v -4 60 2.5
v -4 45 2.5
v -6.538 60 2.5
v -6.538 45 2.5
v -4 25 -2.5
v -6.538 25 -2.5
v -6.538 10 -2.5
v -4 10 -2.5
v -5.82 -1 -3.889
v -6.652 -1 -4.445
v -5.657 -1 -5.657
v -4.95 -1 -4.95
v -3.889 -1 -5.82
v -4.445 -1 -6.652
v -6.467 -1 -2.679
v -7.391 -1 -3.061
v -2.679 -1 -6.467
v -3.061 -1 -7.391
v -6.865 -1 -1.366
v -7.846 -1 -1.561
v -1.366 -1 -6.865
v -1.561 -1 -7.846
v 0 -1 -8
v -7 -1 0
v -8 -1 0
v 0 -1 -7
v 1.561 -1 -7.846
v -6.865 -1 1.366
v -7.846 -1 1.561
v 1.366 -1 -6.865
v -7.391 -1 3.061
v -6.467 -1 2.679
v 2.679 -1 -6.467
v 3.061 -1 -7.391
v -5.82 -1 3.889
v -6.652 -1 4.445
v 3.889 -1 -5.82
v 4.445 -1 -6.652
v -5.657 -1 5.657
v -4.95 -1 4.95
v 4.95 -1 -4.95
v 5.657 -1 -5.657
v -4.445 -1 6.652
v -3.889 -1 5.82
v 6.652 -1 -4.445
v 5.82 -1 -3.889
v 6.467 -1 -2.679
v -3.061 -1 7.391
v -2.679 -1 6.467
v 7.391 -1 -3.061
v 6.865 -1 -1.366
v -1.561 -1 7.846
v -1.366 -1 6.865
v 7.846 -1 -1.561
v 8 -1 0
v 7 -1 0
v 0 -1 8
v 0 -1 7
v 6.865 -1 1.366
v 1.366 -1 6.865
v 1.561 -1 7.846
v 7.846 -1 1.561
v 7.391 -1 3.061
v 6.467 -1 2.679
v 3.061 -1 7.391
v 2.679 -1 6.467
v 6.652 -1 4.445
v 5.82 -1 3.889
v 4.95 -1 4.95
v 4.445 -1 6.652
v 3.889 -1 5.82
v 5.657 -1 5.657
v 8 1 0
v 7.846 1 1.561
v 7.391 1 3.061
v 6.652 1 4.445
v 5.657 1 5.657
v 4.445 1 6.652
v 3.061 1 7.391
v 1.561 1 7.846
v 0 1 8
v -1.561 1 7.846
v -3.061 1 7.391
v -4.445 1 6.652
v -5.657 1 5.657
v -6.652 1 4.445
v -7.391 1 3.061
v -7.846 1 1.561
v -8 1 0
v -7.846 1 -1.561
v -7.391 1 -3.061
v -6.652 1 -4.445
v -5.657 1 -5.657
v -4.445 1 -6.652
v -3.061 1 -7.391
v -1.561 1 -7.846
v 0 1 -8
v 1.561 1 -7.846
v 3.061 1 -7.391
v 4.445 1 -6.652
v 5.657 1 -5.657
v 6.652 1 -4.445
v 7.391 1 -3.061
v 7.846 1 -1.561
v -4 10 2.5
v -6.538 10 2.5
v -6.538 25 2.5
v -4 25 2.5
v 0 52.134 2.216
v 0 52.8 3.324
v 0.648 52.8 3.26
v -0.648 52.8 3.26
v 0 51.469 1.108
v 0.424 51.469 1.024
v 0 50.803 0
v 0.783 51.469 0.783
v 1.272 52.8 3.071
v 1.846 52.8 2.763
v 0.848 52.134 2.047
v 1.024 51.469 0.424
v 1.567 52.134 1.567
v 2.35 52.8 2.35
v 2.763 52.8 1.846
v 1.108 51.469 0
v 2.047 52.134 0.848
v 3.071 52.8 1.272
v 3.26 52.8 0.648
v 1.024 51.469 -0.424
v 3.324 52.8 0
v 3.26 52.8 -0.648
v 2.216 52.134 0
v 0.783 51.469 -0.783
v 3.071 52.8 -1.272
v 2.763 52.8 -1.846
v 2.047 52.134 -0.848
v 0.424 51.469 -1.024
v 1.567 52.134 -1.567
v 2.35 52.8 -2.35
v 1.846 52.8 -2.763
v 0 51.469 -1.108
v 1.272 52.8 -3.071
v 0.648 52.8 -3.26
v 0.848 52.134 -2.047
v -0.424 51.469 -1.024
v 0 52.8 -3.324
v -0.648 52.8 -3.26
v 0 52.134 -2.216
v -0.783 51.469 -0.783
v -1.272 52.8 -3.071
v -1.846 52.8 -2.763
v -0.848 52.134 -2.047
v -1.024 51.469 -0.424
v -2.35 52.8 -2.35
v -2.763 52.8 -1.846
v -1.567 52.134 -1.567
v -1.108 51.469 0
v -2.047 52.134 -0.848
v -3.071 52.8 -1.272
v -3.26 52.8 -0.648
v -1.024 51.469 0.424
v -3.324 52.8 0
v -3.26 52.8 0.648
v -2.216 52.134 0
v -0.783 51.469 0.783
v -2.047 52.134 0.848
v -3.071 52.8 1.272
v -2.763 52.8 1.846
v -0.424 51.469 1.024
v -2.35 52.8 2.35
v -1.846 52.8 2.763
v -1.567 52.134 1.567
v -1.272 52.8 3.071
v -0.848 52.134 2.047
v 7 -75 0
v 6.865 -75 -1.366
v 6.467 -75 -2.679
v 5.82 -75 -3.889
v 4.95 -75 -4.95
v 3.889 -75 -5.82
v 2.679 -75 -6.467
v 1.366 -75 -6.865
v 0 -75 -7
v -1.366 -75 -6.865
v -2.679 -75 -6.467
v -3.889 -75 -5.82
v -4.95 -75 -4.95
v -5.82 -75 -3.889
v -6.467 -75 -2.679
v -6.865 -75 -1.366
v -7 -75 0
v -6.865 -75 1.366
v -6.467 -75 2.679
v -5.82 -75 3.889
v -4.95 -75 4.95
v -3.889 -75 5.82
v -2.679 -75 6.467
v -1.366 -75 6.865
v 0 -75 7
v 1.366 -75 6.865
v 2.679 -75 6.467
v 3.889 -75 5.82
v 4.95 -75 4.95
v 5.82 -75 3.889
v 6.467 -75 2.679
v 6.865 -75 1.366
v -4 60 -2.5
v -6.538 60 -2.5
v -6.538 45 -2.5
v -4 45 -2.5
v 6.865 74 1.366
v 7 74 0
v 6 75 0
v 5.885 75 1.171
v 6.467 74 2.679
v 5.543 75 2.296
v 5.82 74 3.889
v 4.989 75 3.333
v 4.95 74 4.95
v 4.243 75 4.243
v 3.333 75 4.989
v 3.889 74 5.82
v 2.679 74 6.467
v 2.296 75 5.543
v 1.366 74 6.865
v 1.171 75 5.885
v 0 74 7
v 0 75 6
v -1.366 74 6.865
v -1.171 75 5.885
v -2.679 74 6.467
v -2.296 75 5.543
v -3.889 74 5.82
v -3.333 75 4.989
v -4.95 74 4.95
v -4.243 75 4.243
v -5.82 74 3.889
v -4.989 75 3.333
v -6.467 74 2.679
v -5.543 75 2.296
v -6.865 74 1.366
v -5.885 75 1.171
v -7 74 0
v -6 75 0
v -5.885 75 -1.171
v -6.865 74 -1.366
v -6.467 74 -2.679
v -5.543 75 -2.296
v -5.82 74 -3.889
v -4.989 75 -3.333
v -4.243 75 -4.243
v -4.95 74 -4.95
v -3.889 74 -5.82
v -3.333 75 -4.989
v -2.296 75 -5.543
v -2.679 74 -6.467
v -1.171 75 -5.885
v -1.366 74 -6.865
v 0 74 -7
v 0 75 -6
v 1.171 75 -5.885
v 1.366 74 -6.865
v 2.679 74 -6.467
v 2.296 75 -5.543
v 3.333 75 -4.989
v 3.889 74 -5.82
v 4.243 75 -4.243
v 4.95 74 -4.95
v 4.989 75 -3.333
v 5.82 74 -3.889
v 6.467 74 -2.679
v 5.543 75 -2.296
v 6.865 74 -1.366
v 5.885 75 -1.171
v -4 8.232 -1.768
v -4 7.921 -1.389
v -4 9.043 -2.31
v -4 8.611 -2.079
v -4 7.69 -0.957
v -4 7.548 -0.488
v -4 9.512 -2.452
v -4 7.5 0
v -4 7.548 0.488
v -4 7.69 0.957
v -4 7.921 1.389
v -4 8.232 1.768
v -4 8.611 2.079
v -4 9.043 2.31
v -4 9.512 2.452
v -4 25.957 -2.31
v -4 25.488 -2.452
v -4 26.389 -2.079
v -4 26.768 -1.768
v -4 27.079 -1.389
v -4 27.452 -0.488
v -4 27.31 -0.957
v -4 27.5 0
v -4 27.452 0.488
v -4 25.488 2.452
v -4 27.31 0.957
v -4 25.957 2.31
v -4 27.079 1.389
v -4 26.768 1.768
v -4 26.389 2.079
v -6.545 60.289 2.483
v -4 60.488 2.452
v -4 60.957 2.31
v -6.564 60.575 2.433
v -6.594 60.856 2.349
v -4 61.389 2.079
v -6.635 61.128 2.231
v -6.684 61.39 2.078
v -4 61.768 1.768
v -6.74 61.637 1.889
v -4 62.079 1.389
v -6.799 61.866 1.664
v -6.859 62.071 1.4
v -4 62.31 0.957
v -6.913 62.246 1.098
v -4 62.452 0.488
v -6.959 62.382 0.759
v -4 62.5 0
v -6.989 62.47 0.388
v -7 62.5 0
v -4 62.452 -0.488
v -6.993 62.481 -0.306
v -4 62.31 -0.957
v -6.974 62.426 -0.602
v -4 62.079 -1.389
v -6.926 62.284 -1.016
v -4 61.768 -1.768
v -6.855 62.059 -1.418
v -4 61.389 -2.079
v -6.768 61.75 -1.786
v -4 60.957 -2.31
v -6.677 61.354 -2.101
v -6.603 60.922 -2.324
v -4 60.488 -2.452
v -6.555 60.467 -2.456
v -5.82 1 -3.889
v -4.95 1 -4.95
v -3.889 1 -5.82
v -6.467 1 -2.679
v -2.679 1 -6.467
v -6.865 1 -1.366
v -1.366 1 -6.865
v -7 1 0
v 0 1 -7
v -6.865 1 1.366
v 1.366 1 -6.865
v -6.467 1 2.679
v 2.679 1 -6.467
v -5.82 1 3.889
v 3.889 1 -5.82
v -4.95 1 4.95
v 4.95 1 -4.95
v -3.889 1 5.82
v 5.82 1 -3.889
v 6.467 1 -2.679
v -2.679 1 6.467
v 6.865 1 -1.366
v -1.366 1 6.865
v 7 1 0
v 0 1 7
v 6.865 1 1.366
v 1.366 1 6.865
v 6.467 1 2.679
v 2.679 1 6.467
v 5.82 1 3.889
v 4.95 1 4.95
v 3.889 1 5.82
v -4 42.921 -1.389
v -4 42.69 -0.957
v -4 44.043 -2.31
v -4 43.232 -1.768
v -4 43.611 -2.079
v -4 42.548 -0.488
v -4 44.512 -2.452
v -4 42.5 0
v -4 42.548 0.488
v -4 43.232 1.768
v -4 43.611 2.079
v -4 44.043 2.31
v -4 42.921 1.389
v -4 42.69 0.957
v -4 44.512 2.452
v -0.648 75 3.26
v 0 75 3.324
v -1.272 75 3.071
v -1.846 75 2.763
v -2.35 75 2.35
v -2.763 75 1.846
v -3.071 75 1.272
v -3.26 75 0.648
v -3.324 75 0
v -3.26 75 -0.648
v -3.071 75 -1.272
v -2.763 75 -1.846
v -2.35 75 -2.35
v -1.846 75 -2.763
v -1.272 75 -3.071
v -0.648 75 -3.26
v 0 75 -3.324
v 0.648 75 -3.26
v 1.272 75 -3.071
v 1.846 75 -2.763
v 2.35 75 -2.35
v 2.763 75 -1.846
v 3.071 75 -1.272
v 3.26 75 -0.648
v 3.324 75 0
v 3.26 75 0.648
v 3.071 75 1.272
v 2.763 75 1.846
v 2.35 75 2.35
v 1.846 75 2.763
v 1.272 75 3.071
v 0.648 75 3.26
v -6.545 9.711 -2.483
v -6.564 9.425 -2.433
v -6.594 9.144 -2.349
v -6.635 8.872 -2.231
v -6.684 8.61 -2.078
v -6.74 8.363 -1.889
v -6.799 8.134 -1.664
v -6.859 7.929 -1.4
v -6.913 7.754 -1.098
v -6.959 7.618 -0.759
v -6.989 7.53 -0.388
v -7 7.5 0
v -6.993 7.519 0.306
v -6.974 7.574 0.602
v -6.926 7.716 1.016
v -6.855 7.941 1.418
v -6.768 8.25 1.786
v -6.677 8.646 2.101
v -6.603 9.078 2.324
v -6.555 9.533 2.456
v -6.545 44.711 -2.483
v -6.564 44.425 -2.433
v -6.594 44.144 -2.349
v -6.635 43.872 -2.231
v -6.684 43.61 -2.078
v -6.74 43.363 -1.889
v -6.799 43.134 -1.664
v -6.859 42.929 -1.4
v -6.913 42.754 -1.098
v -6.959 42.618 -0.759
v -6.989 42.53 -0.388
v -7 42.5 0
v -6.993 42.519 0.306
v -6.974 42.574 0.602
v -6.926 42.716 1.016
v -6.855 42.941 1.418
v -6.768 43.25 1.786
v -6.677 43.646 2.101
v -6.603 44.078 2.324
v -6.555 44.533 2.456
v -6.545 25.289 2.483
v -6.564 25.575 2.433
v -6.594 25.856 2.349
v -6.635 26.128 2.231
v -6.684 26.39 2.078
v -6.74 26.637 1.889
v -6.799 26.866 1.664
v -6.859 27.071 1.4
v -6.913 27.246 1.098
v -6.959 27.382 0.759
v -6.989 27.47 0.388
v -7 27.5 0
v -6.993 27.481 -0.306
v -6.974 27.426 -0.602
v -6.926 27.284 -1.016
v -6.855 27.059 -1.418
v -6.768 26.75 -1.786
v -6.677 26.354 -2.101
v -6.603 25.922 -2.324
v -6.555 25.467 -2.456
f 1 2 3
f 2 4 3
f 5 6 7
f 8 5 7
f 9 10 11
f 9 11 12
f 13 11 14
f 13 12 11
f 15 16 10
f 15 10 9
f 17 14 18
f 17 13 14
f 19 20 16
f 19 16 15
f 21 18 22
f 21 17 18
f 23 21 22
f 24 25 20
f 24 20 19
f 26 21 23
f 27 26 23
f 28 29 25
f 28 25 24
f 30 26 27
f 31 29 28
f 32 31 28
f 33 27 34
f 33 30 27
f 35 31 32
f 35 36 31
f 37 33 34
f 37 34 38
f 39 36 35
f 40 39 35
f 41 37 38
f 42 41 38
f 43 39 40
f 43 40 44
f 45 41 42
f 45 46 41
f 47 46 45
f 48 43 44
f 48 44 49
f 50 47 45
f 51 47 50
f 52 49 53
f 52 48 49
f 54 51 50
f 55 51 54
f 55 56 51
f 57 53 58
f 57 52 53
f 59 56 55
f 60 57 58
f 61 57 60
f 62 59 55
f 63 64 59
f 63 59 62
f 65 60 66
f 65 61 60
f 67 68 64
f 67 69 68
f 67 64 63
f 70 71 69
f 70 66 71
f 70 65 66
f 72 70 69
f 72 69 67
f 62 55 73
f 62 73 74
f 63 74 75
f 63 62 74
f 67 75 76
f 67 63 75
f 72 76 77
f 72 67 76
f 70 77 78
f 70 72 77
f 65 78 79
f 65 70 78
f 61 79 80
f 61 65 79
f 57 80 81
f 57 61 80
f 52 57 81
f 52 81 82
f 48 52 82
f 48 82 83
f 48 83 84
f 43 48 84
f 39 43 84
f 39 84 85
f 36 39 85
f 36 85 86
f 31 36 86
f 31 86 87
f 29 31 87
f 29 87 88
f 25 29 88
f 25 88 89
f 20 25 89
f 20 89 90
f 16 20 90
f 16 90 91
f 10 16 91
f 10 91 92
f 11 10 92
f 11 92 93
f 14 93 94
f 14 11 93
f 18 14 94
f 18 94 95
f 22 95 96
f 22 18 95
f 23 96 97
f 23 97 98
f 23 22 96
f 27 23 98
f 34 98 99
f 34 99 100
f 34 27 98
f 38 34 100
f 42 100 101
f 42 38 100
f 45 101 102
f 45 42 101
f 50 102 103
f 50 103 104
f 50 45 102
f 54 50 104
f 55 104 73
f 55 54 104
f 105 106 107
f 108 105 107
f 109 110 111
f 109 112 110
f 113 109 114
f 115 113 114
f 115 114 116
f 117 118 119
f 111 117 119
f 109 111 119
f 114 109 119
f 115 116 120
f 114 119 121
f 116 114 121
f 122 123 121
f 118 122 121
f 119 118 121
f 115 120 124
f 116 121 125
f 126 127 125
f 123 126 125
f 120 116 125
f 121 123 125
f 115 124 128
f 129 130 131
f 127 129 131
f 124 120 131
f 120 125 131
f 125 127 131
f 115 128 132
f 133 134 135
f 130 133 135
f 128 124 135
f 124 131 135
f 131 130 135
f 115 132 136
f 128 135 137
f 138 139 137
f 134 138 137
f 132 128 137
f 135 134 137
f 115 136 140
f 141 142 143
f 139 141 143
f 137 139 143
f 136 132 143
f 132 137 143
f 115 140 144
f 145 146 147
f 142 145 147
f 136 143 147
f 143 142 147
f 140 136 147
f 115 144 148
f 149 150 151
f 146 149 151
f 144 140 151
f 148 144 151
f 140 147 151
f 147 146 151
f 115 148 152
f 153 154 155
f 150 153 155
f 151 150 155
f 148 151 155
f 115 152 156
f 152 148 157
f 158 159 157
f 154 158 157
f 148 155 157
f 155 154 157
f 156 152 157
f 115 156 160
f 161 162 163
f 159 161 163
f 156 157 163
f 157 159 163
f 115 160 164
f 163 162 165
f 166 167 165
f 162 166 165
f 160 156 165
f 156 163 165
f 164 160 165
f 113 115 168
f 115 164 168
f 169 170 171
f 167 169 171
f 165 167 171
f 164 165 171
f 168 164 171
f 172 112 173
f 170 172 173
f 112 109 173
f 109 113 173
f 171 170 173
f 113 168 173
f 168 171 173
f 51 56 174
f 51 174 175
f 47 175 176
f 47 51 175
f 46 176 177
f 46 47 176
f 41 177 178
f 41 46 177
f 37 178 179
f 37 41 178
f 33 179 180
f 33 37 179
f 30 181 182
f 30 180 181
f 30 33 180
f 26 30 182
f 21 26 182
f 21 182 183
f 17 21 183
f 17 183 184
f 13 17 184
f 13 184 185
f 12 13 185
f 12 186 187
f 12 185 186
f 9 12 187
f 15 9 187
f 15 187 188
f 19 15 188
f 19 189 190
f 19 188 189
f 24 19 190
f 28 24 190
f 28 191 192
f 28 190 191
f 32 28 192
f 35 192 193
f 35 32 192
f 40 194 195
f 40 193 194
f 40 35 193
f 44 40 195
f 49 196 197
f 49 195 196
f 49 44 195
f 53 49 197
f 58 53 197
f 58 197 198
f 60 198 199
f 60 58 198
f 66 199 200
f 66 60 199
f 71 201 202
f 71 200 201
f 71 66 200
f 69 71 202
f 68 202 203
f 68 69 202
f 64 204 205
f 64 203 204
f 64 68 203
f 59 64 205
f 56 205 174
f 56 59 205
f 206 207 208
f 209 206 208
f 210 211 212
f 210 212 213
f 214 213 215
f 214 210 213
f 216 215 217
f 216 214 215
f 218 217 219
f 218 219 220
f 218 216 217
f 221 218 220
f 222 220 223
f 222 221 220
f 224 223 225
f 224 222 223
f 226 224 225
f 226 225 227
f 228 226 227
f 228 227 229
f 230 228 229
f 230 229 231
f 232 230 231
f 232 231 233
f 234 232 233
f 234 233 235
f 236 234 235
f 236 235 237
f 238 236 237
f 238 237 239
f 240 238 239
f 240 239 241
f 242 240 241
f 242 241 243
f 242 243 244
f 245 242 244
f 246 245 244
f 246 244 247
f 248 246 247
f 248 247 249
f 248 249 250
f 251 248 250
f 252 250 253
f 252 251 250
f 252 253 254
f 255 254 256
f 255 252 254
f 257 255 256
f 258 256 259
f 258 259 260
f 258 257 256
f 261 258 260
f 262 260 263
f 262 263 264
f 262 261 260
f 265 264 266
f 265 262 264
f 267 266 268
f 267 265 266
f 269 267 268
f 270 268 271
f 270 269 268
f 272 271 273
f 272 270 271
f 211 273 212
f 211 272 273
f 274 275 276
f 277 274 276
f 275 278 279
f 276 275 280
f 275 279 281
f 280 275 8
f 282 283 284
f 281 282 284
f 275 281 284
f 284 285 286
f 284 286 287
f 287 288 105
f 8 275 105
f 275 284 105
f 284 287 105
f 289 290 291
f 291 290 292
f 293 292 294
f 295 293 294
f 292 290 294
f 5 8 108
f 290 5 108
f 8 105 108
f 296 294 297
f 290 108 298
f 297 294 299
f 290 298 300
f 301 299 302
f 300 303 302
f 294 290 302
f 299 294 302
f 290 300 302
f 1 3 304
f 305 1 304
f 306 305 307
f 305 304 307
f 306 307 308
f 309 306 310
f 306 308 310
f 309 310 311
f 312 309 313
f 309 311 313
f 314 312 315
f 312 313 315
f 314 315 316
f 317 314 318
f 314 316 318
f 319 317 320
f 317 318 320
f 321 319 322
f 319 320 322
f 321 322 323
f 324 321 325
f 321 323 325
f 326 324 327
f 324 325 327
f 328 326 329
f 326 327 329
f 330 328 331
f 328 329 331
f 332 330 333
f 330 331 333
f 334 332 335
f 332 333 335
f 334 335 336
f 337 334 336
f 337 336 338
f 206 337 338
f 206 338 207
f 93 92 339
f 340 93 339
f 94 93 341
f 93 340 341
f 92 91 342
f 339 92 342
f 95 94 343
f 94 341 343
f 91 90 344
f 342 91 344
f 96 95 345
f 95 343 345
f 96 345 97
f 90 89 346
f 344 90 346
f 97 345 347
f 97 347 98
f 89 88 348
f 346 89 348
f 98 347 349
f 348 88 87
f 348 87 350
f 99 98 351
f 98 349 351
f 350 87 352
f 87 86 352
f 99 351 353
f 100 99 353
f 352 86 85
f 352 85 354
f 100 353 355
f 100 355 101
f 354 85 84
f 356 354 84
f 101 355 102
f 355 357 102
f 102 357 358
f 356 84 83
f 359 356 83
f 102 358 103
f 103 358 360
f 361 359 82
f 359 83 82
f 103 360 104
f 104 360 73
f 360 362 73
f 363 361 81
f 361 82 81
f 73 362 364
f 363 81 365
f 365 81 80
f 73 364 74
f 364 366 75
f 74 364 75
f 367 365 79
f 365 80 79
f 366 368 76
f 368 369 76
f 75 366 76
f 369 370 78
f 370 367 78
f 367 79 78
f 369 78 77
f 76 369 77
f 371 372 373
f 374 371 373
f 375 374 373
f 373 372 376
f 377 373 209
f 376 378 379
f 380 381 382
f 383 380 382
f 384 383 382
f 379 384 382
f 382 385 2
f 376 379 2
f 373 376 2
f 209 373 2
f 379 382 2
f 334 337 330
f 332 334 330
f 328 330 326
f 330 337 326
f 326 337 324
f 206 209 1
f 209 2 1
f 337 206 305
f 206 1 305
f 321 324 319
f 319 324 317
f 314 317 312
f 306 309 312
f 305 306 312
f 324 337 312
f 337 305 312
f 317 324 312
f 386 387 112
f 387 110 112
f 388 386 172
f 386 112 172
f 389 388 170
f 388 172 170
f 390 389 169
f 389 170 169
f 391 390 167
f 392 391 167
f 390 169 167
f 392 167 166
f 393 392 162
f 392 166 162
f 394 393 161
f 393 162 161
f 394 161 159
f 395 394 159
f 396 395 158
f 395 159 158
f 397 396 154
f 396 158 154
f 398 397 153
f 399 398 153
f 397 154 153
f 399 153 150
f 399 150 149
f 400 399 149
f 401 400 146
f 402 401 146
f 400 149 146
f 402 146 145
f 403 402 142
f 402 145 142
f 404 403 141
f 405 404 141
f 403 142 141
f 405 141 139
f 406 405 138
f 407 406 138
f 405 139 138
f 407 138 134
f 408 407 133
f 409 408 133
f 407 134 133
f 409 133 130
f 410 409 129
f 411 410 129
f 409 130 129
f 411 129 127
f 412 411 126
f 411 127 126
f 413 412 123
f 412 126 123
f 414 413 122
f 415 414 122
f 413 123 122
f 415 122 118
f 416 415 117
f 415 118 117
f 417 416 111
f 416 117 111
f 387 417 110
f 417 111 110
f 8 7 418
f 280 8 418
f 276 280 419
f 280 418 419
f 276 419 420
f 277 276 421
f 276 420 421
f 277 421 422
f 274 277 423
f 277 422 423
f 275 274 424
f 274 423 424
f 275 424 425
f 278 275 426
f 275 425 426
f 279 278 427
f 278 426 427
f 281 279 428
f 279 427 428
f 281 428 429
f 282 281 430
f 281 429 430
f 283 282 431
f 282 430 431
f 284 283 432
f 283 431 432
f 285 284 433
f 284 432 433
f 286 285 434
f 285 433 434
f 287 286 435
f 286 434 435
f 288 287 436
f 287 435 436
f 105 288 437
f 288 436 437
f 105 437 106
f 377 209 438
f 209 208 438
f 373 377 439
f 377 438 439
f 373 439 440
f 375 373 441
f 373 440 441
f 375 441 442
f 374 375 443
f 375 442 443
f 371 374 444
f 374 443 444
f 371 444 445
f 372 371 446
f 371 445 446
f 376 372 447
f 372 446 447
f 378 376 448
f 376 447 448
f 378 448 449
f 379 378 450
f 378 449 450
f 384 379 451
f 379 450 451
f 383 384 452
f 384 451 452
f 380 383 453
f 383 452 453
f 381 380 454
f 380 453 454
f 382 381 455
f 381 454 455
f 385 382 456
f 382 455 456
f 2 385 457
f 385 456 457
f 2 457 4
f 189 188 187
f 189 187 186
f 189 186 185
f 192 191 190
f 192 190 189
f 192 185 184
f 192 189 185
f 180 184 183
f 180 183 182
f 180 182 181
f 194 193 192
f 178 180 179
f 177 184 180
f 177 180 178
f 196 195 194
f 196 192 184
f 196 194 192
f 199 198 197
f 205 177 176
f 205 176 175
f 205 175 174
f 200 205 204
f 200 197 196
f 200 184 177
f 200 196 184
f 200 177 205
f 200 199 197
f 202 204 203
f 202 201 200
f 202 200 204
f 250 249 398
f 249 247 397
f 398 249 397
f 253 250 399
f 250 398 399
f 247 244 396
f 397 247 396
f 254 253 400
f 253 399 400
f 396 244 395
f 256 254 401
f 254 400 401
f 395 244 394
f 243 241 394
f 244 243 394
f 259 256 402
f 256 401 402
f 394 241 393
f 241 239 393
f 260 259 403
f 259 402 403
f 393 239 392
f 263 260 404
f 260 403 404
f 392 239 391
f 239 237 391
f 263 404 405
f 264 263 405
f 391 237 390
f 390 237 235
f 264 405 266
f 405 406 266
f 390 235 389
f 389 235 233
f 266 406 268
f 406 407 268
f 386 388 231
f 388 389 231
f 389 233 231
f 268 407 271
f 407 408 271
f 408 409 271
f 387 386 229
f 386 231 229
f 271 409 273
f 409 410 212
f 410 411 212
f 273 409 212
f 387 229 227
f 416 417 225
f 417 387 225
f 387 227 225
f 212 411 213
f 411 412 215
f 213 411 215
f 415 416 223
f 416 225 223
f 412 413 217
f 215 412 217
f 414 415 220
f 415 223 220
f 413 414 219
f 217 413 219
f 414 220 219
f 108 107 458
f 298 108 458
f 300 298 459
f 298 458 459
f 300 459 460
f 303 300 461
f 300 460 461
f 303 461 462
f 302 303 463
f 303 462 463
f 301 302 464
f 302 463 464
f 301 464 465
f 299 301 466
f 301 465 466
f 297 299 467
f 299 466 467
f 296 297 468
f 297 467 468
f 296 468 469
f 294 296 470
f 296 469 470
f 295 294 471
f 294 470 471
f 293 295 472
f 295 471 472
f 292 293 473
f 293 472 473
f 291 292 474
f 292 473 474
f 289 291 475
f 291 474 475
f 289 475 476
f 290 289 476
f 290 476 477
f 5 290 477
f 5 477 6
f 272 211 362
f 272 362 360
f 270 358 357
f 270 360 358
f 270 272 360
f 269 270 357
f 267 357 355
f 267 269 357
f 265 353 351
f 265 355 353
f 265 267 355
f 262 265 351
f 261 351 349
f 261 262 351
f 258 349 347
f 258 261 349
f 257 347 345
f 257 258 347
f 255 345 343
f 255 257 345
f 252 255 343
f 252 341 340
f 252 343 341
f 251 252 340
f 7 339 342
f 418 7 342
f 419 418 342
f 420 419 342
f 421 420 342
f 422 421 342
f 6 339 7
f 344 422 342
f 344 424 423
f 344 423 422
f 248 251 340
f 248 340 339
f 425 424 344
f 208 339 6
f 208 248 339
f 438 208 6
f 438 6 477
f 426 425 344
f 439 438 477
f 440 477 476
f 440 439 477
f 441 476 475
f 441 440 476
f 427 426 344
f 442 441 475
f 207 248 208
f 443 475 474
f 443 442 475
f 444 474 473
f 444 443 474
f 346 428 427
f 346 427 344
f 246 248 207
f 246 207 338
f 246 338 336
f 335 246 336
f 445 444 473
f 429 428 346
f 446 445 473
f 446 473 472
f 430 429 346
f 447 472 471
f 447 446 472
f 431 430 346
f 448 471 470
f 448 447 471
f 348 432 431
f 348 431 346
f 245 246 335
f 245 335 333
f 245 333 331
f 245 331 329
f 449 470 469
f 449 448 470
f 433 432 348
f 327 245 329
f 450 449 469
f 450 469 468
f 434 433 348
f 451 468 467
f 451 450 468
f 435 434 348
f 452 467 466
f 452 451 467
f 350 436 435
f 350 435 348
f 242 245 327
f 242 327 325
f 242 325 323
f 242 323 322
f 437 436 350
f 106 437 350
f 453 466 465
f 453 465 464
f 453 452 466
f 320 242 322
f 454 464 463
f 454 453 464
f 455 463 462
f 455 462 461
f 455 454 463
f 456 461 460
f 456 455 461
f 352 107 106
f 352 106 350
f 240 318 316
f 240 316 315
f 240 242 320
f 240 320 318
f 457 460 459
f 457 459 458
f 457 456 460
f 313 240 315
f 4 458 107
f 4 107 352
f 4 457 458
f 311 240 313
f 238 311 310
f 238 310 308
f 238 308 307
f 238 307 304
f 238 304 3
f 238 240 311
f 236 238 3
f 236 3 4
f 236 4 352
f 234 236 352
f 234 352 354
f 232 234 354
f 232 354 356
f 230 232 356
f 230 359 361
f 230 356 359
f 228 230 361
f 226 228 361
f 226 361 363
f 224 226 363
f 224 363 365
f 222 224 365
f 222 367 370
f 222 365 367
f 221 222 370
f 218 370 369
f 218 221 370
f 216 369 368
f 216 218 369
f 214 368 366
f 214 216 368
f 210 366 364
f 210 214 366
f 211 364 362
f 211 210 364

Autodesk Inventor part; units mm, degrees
ref_plane "XZ Plane" through (0, 0, 0) normal (0, 1, 0) x (-1, 0, 0)
ref_plane "XY Plane" through (0, 0, 0) normal (0, 0, 1) x (1, 0, 0)
sketch "Sketch1" plane through (0, 0, 0) normal (0, 0, 1) x (1, 0, 0)
  line L0 (0, 75) -> (0, -75)
  line L1 (7, 75) -> (0, 75)
  line L2 (7, -75) -> (0, -75)
  line L3 (7, -75) -> (7, 75)
  line L4 (7, 1) -> (8, 1)
  line L5 (8, 1) -> (8, -1)
  line L6 (8, -1) -> (7, -1)
  point P0 (0, 0)
  point P1 (0, 0)
  point P2 (3.5, 75)
  point P3 (8, 0)
  dimension "d17" = 14
  dimension "d42" = 150
  dimension "d43" = 75
  dimension "d44" = 2
  dimension "d45" = 16
revolve "Revolution1" add sketch "Sketch1" angle 360 about axis through (0, 75, 0) along (0, -1, 0)
sketch "Sketch4" plane through (0, 75, 0) normal (0, 1, 0) x (1, 0, 0)
  point P0 (0, 0)
  point P1 (0, 0)
hole "Hole1" at (0, 75, 0) direction (0, -1, 0) diameter 6.647 depth 22.2 tip angle 118 thread size "M8x1.25" class "6H" standard "ISO Metric profile"
chamfer "Chamfer1" distance 1 angle 45 1 edges at (-7, 75, 0)
ref_plane "Work Plane1" through (-7, -38, 0) normal (1, 0, 0) x (0, 1, 0)
sketch "Sketch5" plane through (-7, -38, 0) normal (1, 0, 0) x (0, 1, 0)
  line L0 (-37, 7) -> (-37, -7) projected
  line L1 (112, -7) -> (112, 7) projected
  line L2 (98, 0) -> (83, 0) construction
  line L3 (98, -2.5) -> (83, -2.5)
  line L4 (83, 2.5) -> (98, 2.5)
  arc A0 (98, -2.5) -> (98, 2.5) centre (98, 0) ccw
  arc A1 (83, 2.5) -> (83, -2.5) centre (83, 0) ccw
  line L5 (113, 6) -> (113, -6) projected
  line L6 (63, 0) -> (48, 0) construction
  line L7 (63, -2.5) -> (48, -2.5)
  line L8 (48, 2.5) -> (63, 2.5)
  arc A2 (63, -2.5) -> (63, 2.5) centre (63, 0) ccw
  arc A3 (48, 2.5) -> (48, -2.5) centre (48, 0) ccw
  point P0 (38, 0)
  point P1 (90.5, 0)
  point P2 (55.5, 0)
  dimension "d36" = 5
  dimension "d37" = 15
  dimension "d39" = 15
  dimension "d46" = 5
  dimension "d47" = 15
  dimension "d48" = 35
extrude "Extrusion3" cut sketch "Sketch5" along normal blind 3
equation "\"d47\" = d37"
equation "\"d43\" = 0.5 * d42"
properties part number "приводной вал"
